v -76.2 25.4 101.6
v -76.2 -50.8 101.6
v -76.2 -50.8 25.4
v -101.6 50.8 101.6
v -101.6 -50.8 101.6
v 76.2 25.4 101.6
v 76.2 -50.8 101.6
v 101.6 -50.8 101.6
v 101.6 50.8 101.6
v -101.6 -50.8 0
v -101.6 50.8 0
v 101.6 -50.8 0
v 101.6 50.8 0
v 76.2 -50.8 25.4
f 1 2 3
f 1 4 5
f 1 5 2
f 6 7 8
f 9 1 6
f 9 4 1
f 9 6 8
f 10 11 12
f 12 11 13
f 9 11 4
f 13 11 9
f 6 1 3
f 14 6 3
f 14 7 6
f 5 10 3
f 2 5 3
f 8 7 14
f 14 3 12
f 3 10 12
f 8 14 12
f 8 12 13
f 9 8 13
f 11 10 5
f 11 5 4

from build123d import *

# Parameters (mm, degrees)
F0_W     = 203.2
F0_H     = 101.6
F1_DEPTH = 101.6
F2_W     = 152.4
F2_H     = 76.2
F3_DEPTH = 76.2
F5_DEPTH = 152.4


with BuildPart() as f1:
    # F0 (on Top) → F1 (new body)
    with BuildSketch(Plane.XY):
        Rectangle(F0_W, F0_H)
    extrude(amount=F1_DEPTH)

    # F2 (on face) → F3 (cut)
    with BuildSketch(Plane.XY.offset(101.6)):
        with Locations((0, -12.7)):
            Rectangle(F2_W, F2_H)
    extrude(amount=-F3_DEPTH, mode=Mode.SUBTRACT)

    # F4 (on face) → F5 (join)
    with BuildSketch(Plane.YZ.offset(-76.2)):
        Polygon((25.4, 25.4), (25.4, 101.6), (-50.8, 25.4), align=None)
    extrude(amount=F5_DEPTH)


solid = f1.part
